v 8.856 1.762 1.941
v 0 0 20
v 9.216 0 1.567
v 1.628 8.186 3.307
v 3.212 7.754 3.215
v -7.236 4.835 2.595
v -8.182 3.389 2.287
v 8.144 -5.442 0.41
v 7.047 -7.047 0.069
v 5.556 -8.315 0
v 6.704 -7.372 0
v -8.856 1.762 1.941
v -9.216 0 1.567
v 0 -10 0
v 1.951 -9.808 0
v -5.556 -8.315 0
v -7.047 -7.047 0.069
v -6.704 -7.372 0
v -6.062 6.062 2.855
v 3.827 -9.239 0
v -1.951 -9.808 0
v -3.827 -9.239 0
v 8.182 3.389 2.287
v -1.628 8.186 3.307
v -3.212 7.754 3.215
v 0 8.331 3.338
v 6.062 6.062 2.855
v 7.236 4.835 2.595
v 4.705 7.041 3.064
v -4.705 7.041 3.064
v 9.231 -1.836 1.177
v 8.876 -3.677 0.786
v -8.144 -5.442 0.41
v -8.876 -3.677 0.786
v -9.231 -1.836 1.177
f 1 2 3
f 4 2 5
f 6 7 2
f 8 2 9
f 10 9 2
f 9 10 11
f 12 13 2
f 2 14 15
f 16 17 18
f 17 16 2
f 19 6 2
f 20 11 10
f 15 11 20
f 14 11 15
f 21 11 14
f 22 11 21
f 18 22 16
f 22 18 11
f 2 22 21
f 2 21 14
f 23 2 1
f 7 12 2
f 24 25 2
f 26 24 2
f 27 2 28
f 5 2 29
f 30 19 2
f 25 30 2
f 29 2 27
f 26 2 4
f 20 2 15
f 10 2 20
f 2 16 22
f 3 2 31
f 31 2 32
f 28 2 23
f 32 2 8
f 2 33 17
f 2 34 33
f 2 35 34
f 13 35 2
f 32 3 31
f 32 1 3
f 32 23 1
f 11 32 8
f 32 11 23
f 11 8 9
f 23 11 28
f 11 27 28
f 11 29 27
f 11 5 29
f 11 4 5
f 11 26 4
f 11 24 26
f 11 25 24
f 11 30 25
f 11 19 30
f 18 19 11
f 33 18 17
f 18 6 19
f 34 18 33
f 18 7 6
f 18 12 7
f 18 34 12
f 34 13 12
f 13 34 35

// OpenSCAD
// A cone whose base rim is cut away, which is what a declaration is for.
//
// The exporter can recognise a cone from its two rims: find a declared circle
// at either end and the wall between them is conical. That recognition is
// conditioned on both rims surviving whatever the model does next, and a
// boolean is exactly what removes one. Here the cut takes the base rim, and an
// apex is not a rim - there is no circle there to declare, only a point - so
// after the cut this solid has no pair of rims left to be recognised from.
//
// Before CylinderNode declared the cone itself, that was fatal: sixty-six
// planes, the whole taper lost, on a shape whose generator knew exactly what
// surface it was making. A ConeSurface is a radius and a slope and needs no
// second rim, so it survives the cut that the rims do not.
// EXPECT: 1 analytic surface available (0 cylindrical, 0 spherical, 0 toroidal, 0 Bezier, 1 conical)
//
// The exact tier no longer declines it, and what changed is worth stating: the
// cut edge is a plane section of the cone taken at 12 degrees, which is less
// than the cone's own half angle of atan(10/20) = 26.57, so the section closes
// and is an ellipse. That ellipse is now written as one, and the face across it
// - the cube's, whose plane the model declares - is handed the same edge.
//
// The other half of the change is not about sections at all. The taper's other
// boundaries are its *generators*, straight lines running to the apex, and a
// generator lies exactly on the cone. They were being refused because the test
// asked whether an edge ran parallel to the axis, which is a cylinder's answer;
// a cone's rulings converge. Both together, all four regions are writable.
// EXPECT: 4 trimmed quadrics written as one face each, replacing 30 facets
// EXPECT: 2 plane sections written as the conic it is - 2 on a plane the model declared
//
// Two sections, not four, and both declared: the cut is one plane and the cube
// declares it, so however many faces the taper is split into they share one
// ellipse, cut into the two arcs that survive above z = 0.
//
// Where the taper's lower boundary is the ellipse and where it is the base rim
// is derived. On the cone, radius R(z) = 10 - z/2, the cut keeps
//     z >= (1.566998 + 2.12557 sin(theta)) / (1 + 0.1062785 sin(theta))
// which is zero at sin(theta) = -0.737207, so for theta between 227.52 and
// 312.48 degrees the cut passes below z = 0 and the base rim bounds the taper
// instead. That is why two of the four faces are bounded by circle arcs and two
// by an ellipse arc - and why the two faces that reach the apex have three edges
// each: an arc and two generators meeting at a point where the surface itself
// closes.
// ROUNDTRIP: Cone=4 Plane=4
// EDGES: Circle=6 Ellipse=2 Line=11
//
// Why four faces rather than three - the region runs all the way round the axis
// and is cut where it must be - is the exporter's business and is deliberately
// not explained here. Stating a reason for it would be inventing one. If that
// changes, this line moves and the reason is worked out then.
//
// Derived. The kept solid is the cone r=10, h=20 above the cube's top face,
// which after rotate([12,0,0]) and translate([0,0,-1.5]) is the plane through
// (0, -3sin12, 3cos12 - 1.5) with normal (0, -sin12, cos12). Integrating the
// area of each z-slice - a disc of radius 10(1 - z/20) cut by y < ycut(z) -
// over z in [0,20] gives 1661.646512. The same integral with a 32-gon in place
// of the disc gives 1650.966482, which is what the mesh measures, so the
// integral is checked against something the exporter had no hand in.
//
// The approximation tier read 1661.646504 - eight parts in a million of a
// millimetre cubed from the ideal solid, where before that it was 1.94 short.
// So the window came off: the default 1e-6 relative is 0.0017, and being inside
// it is the assertion that the exported solid *is* the intended one. Since
// 2026-09-25 OCCT reads 1661.647752 (1661.647203 integrated tightly): the taper
// is one face now, not two, and the reader projects its own pcurve for the
// ellipse across the whole of it. The file's geometry did not move with it - a
// triangulation of each at 1e-4 agrees with the two-face file's to 1e-4.
// VOLUME-APPROX: 1661.646512
//
// At this tier the taper is one region, and it wraps the axis with the apex
// inside it: a disc on the cone, bounded by one loop - the base arcs and the
// ellipse. The quadric pass used to cut every wrapping region in two, which put
// a generator between two faces of one surface that the model does not have
// (checklist D1). A disc containing the apex needs no cut, only a seam up a
// generator, because the surface is periodic round the axis.
// APPROX: 1 trimmed quadric written as one face each, replacing 32 facets
// APPROX: 1 cone face closed round its apex by a seam up a generator
// ROUNDTRIP-APPROX: Cone=1 Plane=2
//
// The exact tier reads 1660.807437, 0.84 short, and the shortfall is named
// rather than tolerated: its corner placement does not run, so the two points
// where the cut crosses z = 0 sit on a chord of the base 32-gon at radius
// 9.9645 instead of on the rim at 10. It is not asserted here, because a figure
// that is neither the ideal solid nor the mesh's is a figure only this
// exporter's current behaviour explains - which is what
// doc/step-export-development.md means by captured. When that placement reaches the
// exact tier the two tiers agree and VOLUME: joins VOLUME-APPROX: above.
//
// Every facet its maker named for a declared surface is D0 by that heritage,
// whole or cut, and has to end in a face written on that surface (checklist
// B6, B7, E8). A facet a boolean cut is not in its surface's D0 region yet -
// the region holds whole facets only - so nothing proposes it at the exact
// tier, and at the approximation tier a statistic over the tessellation
// refuses it (C3). Measured 2026-09-29:
//   exact tier, 2 facets (2 cut): 2 on cone 1 (claimed by nothing for it)
// Tolerated by name until cut facets join their region and no statistic
// vetoes a named facet (doc/step-export-wip.md, open item 34); the test
// fails the day it is no longer raised.
// KNOWN-EXPORT-ERROR: facets named by their maker for a declared surface are not written on it
$fn = 32;
difference() {
	cylinder(r1 = 10, r2 = 0, h = 20);
	translate([0, 0, -1.5]) rotate([12, 0, 0]) cube([60, 60, 6], center = true);
}
